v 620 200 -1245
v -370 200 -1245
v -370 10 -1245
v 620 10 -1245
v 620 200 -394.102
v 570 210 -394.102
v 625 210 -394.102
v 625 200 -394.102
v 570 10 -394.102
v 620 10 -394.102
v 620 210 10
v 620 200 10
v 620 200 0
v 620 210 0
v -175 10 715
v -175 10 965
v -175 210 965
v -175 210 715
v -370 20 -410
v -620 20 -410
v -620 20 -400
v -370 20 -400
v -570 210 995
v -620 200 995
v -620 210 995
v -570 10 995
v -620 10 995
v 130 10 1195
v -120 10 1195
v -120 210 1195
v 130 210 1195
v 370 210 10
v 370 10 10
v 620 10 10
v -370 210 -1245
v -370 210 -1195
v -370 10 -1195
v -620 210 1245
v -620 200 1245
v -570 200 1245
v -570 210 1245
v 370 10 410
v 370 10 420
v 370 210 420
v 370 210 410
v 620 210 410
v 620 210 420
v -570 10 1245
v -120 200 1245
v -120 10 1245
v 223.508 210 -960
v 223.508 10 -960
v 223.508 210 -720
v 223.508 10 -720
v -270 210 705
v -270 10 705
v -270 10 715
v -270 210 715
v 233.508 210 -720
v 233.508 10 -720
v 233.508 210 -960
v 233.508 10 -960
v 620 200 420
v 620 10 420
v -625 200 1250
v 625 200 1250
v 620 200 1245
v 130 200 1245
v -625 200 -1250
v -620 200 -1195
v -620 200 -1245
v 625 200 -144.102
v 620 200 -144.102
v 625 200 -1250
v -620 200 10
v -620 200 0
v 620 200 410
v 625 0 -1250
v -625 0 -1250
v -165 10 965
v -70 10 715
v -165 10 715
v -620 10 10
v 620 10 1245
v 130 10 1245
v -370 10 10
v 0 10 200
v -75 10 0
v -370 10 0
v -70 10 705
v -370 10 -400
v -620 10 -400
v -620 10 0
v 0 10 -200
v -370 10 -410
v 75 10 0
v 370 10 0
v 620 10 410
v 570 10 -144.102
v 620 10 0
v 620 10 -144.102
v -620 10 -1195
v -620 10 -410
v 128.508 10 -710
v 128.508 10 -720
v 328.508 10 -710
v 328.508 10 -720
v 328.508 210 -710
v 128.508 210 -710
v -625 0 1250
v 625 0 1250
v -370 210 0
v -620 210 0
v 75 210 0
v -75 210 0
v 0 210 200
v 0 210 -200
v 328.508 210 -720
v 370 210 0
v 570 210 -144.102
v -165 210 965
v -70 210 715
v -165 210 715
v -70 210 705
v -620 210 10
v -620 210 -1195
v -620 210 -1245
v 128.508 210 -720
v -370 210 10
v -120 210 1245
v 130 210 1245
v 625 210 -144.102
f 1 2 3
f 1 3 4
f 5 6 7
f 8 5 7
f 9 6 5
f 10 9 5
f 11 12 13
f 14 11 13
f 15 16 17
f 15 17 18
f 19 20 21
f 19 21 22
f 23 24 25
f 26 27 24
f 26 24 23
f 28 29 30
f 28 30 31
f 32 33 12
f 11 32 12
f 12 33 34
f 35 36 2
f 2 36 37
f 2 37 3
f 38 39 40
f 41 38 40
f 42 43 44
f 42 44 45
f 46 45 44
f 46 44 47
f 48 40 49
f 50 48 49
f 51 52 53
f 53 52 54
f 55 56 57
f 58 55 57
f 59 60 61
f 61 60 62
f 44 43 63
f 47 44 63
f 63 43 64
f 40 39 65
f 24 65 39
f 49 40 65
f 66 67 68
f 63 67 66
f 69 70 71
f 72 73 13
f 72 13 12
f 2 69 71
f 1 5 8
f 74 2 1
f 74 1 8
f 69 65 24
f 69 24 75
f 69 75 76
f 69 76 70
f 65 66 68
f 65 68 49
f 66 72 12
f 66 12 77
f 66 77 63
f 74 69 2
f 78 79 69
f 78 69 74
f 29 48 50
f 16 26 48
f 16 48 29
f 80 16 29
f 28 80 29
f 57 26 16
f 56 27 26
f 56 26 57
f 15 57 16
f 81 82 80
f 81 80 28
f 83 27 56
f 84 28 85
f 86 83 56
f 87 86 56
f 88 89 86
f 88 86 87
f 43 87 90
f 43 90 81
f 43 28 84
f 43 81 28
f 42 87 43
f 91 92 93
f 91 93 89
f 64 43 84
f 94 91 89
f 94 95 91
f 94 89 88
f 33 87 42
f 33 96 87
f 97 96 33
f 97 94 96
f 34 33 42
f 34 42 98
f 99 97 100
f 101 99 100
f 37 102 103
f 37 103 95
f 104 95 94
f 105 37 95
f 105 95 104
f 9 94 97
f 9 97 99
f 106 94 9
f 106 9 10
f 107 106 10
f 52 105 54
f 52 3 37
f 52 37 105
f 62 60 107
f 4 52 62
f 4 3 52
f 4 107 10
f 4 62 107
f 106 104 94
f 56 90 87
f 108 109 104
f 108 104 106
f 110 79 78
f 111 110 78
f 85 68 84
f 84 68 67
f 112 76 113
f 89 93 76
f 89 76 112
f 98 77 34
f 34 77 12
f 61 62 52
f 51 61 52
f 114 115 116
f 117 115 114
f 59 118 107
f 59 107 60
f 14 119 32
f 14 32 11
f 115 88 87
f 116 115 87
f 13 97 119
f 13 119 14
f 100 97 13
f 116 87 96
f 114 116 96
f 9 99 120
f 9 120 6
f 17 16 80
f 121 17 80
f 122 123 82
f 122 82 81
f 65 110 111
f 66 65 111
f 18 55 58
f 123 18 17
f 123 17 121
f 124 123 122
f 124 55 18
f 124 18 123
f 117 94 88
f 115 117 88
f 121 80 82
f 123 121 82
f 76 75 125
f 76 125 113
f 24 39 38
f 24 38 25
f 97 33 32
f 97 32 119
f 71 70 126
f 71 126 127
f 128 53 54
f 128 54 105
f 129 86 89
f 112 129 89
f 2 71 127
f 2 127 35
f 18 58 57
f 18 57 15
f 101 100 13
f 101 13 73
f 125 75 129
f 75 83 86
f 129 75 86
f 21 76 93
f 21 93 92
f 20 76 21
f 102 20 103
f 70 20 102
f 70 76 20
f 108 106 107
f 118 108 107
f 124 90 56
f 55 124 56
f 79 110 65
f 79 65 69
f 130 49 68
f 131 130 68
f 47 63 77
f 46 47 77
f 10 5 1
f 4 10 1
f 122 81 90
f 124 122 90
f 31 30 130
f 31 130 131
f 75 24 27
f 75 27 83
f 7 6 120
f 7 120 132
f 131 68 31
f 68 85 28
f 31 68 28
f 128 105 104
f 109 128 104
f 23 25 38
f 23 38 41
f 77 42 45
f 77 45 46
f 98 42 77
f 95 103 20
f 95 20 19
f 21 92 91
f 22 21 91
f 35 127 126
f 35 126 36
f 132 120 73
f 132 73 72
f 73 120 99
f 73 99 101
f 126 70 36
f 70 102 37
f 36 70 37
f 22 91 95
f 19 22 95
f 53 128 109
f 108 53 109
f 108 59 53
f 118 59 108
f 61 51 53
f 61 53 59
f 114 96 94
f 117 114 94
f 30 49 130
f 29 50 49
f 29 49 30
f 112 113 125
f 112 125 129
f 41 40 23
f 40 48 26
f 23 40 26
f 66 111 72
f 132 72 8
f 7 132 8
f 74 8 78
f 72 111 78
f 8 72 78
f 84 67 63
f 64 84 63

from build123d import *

# Parameters (mm, degrees)
SKETCH1_W            = 1250
SKETCH1_H            = 2500
BOSS_EXTRUDE1_DEPTH  = 200
SKETCH2_W            = 1240
SKETCH2_H            = 2490
CUT_EXTRUDE1_DEPTH   = 190
BOSS_EXTRUDE2_DEPTH  = 200
SKETCH8_W            = 10
SKETCH8_H            = 250
BOSS_EXTRUDE3_DEPTH  = 200
SKETCH10_W           = 250
SKETCH10_H           = 10
BOSS_EXTRUDE4_DEPTH  = 200
BOSS_EXTRUDE8_DEPTH  = 200
SKETCH11_W           = 250
SKETCH11_H           = 10
BOSS_EXTRUDE5_DEPTH  = 200
SKETCH12_W           = 250
SKETCH12_H           = 10
BOSS_EXTRUDE6_DEPTH  = 200
SKETCH18_W           = 250
SKETCH18_H           = 10
BOSS_EXTRUDE9_DEPTH  = 10
BOSS_EXTRUDE10_DEPTH = 200
SKETCH23_W           = 50
SKETCH23_H           = 250
BOSS_EXTRUDE11_DEPTH = 200
SKETCH24_W           = 250
SKETCH24_H           = 50
BOSS_EXTRUDE12_DEPTH = 200
SKETCH25_W           = 250
SKETCH25_H           = 50
BOSS_EXTRUDE13_DEPTH = 200
SKETCH26_W           = 55
SKETCH26_H           = 250
BOSS_EXTRUDE14_DEPTH = 200


with BuildPart() as part:
    # Sketch1 → Boss-Extrude1 (new body)
    with BuildSketch(Plane(origin=(0, 0, 0), x_dir=(1, 0, 0), z_dir=(0, 1, 0))):
        Rectangle(SKETCH1_W, SKETCH1_H)
    extrude(amount=BOSS_EXTRUDE1_DEPTH)

    # Sketch2 → Cut-Extrude1 (cut)
    with BuildSketch(Plane(origin=(0, 200, 0), x_dir=(1, 0, 0), z_dir=(0, 1, 0))):
        Rectangle(SKETCH2_W, SKETCH2_H)
    extrude(amount=-CUT_EXTRUDE1_DEPTH, mode=Mode.SUBTRACT)

    # Sketch7 → Boss-Extrude2 (add)
    with BuildSketch(Plane(origin=(0, 10, 0), x_dir=(1, 0, 0), z_dir=(0, 1, 0))):
        Polygon((-170, -705), (-270, -705), (-270, -715), (-117.906694844, -715), (-70, -715), (-70, -705), align=None)
    extrude(amount=BOSS_EXTRUDE2_DEPTH)

    # Sketch8 → Boss-Extrude3 (add)
    with BuildSketch(Plane(origin=(0, 10, 0), x_dir=(1, 0, 0), z_dir=(0, 1, 0))):
        with Locations((-170, -840)):
            Rectangle(SKETCH8_W, SKETCH8_H)
    extrude(amount=BOSS_EXTRUDE3_DEPTH)

    # Sketch10 → Boss-Extrude4 (add)
    with BuildSketch(Plane(origin=(0, 10, 0), x_dir=(1, 0, 0), z_dir=(0, 1, 0))):
        with Locations((-495, -5)):
            Rectangle(SKETCH10_W, SKETCH10_H)
    extrude(amount=BOSS_EXTRUDE4_DEPTH)

    # Sketch17 → Boss-Extrude8 (add)
    with BuildSketch(Plane(origin=(0, 10, 0), x_dir=(1, 0, 0), z_dir=(0, 1, 0))):
        Polygon((0, 200), (-75, 0), (0, -200), (75, 0), align=None)
    extrude(amount=BOSS_EXTRUDE8_DEPTH)

    # Sketch11 → Boss-Extrude5 (add)
    with BuildSketch(Plane(origin=(0, 10, 0), x_dir=(1, 0, 0), z_dir=(0, 1, 0))):
        with Locations((495, -5)):
            Rectangle(SKETCH11_W, SKETCH11_H)
    extrude(amount=BOSS_EXTRUDE5_DEPTH)

    # Sketch12 → Boss-Extrude6 (add)
    with BuildSketch(Plane(origin=(0, 10, 0), x_dir=(1, 0, 0), z_dir=(0, 1, 0))):
        with Locations((495, -415)):
            Rectangle(SKETCH12_W, SKETCH12_H)
    extrude(amount=BOSS_EXTRUDE6_DEPTH)

    # Sketch18 → Boss-Extrude9 (add)
    with BuildSketch(Plane(origin=(0, 10, 0), x_dir=(1, 0, 0), z_dir=(0, 1, 0))):
        with Locations((-495, 405)):
            Rectangle(SKETCH18_W, SKETCH18_H)
    extrude(amount=BOSS_EXTRUDE9_DEPTH)

    # Sketch21 → Boss-Extrude10 (add)
    with BuildSketch(Plane(origin=(0, 10, 0), x_dir=(1, 0, 0), z_dir=(0, 1, 0))):
        Polygon((170, 710), (328.507885592, 710), (328.507885592, 720), (233.507885592, 720), (233.507885592, 960), (223.507885592, 960), (223.507885592, 720), (128.507885592, 720), (128.507885592, 710), align=None)
    extrude(amount=BOSS_EXTRUDE10_DEPTH)

    # Sketch23 → Boss-Extrude11 (add)
    with BuildSketch(Plane(origin=(0, 10, 0), x_dir=(1, 0, 0), z_dir=(0, 1, 0))):
        with Locations((-595, -1120)):
            Rectangle(SKETCH23_W, SKETCH23_H)
    extrude(amount=BOSS_EXTRUDE11_DEPTH)

    # Sketch24 → Boss-Extrude12 (add)
    with BuildSketch(Plane(origin=(0, 10, 0), x_dir=(1, 0, 0), z_dir=(0, 1, 0))):
        with Locations((5, -1220)):
            Rectangle(SKETCH24_W, SKETCH24_H)
    extrude(amount=BOSS_EXTRUDE12_DEPTH)

    # Sketch25 → Boss-Extrude13 (add)
    with BuildSketch(Plane(origin=(0, 10, 0), x_dir=(1, 0, 0), z_dir=(0, 1, 0))):
        with Locations((-495, 1220)):
            Rectangle(SKETCH25_W, SKETCH25_H)
    extrude(amount=BOSS_EXTRUDE13_DEPTH)

    # Sketch26 → Boss-Extrude14 (add)
    with BuildSketch(Plane(origin=(0, 10, 0), x_dir=(1, 0, 0), z_dir=(0, 1, 0))):
        with Locations((597.5, 269.101726834)):
            Rectangle(SKETCH26_W, SKETCH26_H)
    extrude(amount=BOSS_EXTRUDE14_DEPTH)


solid = part.part
